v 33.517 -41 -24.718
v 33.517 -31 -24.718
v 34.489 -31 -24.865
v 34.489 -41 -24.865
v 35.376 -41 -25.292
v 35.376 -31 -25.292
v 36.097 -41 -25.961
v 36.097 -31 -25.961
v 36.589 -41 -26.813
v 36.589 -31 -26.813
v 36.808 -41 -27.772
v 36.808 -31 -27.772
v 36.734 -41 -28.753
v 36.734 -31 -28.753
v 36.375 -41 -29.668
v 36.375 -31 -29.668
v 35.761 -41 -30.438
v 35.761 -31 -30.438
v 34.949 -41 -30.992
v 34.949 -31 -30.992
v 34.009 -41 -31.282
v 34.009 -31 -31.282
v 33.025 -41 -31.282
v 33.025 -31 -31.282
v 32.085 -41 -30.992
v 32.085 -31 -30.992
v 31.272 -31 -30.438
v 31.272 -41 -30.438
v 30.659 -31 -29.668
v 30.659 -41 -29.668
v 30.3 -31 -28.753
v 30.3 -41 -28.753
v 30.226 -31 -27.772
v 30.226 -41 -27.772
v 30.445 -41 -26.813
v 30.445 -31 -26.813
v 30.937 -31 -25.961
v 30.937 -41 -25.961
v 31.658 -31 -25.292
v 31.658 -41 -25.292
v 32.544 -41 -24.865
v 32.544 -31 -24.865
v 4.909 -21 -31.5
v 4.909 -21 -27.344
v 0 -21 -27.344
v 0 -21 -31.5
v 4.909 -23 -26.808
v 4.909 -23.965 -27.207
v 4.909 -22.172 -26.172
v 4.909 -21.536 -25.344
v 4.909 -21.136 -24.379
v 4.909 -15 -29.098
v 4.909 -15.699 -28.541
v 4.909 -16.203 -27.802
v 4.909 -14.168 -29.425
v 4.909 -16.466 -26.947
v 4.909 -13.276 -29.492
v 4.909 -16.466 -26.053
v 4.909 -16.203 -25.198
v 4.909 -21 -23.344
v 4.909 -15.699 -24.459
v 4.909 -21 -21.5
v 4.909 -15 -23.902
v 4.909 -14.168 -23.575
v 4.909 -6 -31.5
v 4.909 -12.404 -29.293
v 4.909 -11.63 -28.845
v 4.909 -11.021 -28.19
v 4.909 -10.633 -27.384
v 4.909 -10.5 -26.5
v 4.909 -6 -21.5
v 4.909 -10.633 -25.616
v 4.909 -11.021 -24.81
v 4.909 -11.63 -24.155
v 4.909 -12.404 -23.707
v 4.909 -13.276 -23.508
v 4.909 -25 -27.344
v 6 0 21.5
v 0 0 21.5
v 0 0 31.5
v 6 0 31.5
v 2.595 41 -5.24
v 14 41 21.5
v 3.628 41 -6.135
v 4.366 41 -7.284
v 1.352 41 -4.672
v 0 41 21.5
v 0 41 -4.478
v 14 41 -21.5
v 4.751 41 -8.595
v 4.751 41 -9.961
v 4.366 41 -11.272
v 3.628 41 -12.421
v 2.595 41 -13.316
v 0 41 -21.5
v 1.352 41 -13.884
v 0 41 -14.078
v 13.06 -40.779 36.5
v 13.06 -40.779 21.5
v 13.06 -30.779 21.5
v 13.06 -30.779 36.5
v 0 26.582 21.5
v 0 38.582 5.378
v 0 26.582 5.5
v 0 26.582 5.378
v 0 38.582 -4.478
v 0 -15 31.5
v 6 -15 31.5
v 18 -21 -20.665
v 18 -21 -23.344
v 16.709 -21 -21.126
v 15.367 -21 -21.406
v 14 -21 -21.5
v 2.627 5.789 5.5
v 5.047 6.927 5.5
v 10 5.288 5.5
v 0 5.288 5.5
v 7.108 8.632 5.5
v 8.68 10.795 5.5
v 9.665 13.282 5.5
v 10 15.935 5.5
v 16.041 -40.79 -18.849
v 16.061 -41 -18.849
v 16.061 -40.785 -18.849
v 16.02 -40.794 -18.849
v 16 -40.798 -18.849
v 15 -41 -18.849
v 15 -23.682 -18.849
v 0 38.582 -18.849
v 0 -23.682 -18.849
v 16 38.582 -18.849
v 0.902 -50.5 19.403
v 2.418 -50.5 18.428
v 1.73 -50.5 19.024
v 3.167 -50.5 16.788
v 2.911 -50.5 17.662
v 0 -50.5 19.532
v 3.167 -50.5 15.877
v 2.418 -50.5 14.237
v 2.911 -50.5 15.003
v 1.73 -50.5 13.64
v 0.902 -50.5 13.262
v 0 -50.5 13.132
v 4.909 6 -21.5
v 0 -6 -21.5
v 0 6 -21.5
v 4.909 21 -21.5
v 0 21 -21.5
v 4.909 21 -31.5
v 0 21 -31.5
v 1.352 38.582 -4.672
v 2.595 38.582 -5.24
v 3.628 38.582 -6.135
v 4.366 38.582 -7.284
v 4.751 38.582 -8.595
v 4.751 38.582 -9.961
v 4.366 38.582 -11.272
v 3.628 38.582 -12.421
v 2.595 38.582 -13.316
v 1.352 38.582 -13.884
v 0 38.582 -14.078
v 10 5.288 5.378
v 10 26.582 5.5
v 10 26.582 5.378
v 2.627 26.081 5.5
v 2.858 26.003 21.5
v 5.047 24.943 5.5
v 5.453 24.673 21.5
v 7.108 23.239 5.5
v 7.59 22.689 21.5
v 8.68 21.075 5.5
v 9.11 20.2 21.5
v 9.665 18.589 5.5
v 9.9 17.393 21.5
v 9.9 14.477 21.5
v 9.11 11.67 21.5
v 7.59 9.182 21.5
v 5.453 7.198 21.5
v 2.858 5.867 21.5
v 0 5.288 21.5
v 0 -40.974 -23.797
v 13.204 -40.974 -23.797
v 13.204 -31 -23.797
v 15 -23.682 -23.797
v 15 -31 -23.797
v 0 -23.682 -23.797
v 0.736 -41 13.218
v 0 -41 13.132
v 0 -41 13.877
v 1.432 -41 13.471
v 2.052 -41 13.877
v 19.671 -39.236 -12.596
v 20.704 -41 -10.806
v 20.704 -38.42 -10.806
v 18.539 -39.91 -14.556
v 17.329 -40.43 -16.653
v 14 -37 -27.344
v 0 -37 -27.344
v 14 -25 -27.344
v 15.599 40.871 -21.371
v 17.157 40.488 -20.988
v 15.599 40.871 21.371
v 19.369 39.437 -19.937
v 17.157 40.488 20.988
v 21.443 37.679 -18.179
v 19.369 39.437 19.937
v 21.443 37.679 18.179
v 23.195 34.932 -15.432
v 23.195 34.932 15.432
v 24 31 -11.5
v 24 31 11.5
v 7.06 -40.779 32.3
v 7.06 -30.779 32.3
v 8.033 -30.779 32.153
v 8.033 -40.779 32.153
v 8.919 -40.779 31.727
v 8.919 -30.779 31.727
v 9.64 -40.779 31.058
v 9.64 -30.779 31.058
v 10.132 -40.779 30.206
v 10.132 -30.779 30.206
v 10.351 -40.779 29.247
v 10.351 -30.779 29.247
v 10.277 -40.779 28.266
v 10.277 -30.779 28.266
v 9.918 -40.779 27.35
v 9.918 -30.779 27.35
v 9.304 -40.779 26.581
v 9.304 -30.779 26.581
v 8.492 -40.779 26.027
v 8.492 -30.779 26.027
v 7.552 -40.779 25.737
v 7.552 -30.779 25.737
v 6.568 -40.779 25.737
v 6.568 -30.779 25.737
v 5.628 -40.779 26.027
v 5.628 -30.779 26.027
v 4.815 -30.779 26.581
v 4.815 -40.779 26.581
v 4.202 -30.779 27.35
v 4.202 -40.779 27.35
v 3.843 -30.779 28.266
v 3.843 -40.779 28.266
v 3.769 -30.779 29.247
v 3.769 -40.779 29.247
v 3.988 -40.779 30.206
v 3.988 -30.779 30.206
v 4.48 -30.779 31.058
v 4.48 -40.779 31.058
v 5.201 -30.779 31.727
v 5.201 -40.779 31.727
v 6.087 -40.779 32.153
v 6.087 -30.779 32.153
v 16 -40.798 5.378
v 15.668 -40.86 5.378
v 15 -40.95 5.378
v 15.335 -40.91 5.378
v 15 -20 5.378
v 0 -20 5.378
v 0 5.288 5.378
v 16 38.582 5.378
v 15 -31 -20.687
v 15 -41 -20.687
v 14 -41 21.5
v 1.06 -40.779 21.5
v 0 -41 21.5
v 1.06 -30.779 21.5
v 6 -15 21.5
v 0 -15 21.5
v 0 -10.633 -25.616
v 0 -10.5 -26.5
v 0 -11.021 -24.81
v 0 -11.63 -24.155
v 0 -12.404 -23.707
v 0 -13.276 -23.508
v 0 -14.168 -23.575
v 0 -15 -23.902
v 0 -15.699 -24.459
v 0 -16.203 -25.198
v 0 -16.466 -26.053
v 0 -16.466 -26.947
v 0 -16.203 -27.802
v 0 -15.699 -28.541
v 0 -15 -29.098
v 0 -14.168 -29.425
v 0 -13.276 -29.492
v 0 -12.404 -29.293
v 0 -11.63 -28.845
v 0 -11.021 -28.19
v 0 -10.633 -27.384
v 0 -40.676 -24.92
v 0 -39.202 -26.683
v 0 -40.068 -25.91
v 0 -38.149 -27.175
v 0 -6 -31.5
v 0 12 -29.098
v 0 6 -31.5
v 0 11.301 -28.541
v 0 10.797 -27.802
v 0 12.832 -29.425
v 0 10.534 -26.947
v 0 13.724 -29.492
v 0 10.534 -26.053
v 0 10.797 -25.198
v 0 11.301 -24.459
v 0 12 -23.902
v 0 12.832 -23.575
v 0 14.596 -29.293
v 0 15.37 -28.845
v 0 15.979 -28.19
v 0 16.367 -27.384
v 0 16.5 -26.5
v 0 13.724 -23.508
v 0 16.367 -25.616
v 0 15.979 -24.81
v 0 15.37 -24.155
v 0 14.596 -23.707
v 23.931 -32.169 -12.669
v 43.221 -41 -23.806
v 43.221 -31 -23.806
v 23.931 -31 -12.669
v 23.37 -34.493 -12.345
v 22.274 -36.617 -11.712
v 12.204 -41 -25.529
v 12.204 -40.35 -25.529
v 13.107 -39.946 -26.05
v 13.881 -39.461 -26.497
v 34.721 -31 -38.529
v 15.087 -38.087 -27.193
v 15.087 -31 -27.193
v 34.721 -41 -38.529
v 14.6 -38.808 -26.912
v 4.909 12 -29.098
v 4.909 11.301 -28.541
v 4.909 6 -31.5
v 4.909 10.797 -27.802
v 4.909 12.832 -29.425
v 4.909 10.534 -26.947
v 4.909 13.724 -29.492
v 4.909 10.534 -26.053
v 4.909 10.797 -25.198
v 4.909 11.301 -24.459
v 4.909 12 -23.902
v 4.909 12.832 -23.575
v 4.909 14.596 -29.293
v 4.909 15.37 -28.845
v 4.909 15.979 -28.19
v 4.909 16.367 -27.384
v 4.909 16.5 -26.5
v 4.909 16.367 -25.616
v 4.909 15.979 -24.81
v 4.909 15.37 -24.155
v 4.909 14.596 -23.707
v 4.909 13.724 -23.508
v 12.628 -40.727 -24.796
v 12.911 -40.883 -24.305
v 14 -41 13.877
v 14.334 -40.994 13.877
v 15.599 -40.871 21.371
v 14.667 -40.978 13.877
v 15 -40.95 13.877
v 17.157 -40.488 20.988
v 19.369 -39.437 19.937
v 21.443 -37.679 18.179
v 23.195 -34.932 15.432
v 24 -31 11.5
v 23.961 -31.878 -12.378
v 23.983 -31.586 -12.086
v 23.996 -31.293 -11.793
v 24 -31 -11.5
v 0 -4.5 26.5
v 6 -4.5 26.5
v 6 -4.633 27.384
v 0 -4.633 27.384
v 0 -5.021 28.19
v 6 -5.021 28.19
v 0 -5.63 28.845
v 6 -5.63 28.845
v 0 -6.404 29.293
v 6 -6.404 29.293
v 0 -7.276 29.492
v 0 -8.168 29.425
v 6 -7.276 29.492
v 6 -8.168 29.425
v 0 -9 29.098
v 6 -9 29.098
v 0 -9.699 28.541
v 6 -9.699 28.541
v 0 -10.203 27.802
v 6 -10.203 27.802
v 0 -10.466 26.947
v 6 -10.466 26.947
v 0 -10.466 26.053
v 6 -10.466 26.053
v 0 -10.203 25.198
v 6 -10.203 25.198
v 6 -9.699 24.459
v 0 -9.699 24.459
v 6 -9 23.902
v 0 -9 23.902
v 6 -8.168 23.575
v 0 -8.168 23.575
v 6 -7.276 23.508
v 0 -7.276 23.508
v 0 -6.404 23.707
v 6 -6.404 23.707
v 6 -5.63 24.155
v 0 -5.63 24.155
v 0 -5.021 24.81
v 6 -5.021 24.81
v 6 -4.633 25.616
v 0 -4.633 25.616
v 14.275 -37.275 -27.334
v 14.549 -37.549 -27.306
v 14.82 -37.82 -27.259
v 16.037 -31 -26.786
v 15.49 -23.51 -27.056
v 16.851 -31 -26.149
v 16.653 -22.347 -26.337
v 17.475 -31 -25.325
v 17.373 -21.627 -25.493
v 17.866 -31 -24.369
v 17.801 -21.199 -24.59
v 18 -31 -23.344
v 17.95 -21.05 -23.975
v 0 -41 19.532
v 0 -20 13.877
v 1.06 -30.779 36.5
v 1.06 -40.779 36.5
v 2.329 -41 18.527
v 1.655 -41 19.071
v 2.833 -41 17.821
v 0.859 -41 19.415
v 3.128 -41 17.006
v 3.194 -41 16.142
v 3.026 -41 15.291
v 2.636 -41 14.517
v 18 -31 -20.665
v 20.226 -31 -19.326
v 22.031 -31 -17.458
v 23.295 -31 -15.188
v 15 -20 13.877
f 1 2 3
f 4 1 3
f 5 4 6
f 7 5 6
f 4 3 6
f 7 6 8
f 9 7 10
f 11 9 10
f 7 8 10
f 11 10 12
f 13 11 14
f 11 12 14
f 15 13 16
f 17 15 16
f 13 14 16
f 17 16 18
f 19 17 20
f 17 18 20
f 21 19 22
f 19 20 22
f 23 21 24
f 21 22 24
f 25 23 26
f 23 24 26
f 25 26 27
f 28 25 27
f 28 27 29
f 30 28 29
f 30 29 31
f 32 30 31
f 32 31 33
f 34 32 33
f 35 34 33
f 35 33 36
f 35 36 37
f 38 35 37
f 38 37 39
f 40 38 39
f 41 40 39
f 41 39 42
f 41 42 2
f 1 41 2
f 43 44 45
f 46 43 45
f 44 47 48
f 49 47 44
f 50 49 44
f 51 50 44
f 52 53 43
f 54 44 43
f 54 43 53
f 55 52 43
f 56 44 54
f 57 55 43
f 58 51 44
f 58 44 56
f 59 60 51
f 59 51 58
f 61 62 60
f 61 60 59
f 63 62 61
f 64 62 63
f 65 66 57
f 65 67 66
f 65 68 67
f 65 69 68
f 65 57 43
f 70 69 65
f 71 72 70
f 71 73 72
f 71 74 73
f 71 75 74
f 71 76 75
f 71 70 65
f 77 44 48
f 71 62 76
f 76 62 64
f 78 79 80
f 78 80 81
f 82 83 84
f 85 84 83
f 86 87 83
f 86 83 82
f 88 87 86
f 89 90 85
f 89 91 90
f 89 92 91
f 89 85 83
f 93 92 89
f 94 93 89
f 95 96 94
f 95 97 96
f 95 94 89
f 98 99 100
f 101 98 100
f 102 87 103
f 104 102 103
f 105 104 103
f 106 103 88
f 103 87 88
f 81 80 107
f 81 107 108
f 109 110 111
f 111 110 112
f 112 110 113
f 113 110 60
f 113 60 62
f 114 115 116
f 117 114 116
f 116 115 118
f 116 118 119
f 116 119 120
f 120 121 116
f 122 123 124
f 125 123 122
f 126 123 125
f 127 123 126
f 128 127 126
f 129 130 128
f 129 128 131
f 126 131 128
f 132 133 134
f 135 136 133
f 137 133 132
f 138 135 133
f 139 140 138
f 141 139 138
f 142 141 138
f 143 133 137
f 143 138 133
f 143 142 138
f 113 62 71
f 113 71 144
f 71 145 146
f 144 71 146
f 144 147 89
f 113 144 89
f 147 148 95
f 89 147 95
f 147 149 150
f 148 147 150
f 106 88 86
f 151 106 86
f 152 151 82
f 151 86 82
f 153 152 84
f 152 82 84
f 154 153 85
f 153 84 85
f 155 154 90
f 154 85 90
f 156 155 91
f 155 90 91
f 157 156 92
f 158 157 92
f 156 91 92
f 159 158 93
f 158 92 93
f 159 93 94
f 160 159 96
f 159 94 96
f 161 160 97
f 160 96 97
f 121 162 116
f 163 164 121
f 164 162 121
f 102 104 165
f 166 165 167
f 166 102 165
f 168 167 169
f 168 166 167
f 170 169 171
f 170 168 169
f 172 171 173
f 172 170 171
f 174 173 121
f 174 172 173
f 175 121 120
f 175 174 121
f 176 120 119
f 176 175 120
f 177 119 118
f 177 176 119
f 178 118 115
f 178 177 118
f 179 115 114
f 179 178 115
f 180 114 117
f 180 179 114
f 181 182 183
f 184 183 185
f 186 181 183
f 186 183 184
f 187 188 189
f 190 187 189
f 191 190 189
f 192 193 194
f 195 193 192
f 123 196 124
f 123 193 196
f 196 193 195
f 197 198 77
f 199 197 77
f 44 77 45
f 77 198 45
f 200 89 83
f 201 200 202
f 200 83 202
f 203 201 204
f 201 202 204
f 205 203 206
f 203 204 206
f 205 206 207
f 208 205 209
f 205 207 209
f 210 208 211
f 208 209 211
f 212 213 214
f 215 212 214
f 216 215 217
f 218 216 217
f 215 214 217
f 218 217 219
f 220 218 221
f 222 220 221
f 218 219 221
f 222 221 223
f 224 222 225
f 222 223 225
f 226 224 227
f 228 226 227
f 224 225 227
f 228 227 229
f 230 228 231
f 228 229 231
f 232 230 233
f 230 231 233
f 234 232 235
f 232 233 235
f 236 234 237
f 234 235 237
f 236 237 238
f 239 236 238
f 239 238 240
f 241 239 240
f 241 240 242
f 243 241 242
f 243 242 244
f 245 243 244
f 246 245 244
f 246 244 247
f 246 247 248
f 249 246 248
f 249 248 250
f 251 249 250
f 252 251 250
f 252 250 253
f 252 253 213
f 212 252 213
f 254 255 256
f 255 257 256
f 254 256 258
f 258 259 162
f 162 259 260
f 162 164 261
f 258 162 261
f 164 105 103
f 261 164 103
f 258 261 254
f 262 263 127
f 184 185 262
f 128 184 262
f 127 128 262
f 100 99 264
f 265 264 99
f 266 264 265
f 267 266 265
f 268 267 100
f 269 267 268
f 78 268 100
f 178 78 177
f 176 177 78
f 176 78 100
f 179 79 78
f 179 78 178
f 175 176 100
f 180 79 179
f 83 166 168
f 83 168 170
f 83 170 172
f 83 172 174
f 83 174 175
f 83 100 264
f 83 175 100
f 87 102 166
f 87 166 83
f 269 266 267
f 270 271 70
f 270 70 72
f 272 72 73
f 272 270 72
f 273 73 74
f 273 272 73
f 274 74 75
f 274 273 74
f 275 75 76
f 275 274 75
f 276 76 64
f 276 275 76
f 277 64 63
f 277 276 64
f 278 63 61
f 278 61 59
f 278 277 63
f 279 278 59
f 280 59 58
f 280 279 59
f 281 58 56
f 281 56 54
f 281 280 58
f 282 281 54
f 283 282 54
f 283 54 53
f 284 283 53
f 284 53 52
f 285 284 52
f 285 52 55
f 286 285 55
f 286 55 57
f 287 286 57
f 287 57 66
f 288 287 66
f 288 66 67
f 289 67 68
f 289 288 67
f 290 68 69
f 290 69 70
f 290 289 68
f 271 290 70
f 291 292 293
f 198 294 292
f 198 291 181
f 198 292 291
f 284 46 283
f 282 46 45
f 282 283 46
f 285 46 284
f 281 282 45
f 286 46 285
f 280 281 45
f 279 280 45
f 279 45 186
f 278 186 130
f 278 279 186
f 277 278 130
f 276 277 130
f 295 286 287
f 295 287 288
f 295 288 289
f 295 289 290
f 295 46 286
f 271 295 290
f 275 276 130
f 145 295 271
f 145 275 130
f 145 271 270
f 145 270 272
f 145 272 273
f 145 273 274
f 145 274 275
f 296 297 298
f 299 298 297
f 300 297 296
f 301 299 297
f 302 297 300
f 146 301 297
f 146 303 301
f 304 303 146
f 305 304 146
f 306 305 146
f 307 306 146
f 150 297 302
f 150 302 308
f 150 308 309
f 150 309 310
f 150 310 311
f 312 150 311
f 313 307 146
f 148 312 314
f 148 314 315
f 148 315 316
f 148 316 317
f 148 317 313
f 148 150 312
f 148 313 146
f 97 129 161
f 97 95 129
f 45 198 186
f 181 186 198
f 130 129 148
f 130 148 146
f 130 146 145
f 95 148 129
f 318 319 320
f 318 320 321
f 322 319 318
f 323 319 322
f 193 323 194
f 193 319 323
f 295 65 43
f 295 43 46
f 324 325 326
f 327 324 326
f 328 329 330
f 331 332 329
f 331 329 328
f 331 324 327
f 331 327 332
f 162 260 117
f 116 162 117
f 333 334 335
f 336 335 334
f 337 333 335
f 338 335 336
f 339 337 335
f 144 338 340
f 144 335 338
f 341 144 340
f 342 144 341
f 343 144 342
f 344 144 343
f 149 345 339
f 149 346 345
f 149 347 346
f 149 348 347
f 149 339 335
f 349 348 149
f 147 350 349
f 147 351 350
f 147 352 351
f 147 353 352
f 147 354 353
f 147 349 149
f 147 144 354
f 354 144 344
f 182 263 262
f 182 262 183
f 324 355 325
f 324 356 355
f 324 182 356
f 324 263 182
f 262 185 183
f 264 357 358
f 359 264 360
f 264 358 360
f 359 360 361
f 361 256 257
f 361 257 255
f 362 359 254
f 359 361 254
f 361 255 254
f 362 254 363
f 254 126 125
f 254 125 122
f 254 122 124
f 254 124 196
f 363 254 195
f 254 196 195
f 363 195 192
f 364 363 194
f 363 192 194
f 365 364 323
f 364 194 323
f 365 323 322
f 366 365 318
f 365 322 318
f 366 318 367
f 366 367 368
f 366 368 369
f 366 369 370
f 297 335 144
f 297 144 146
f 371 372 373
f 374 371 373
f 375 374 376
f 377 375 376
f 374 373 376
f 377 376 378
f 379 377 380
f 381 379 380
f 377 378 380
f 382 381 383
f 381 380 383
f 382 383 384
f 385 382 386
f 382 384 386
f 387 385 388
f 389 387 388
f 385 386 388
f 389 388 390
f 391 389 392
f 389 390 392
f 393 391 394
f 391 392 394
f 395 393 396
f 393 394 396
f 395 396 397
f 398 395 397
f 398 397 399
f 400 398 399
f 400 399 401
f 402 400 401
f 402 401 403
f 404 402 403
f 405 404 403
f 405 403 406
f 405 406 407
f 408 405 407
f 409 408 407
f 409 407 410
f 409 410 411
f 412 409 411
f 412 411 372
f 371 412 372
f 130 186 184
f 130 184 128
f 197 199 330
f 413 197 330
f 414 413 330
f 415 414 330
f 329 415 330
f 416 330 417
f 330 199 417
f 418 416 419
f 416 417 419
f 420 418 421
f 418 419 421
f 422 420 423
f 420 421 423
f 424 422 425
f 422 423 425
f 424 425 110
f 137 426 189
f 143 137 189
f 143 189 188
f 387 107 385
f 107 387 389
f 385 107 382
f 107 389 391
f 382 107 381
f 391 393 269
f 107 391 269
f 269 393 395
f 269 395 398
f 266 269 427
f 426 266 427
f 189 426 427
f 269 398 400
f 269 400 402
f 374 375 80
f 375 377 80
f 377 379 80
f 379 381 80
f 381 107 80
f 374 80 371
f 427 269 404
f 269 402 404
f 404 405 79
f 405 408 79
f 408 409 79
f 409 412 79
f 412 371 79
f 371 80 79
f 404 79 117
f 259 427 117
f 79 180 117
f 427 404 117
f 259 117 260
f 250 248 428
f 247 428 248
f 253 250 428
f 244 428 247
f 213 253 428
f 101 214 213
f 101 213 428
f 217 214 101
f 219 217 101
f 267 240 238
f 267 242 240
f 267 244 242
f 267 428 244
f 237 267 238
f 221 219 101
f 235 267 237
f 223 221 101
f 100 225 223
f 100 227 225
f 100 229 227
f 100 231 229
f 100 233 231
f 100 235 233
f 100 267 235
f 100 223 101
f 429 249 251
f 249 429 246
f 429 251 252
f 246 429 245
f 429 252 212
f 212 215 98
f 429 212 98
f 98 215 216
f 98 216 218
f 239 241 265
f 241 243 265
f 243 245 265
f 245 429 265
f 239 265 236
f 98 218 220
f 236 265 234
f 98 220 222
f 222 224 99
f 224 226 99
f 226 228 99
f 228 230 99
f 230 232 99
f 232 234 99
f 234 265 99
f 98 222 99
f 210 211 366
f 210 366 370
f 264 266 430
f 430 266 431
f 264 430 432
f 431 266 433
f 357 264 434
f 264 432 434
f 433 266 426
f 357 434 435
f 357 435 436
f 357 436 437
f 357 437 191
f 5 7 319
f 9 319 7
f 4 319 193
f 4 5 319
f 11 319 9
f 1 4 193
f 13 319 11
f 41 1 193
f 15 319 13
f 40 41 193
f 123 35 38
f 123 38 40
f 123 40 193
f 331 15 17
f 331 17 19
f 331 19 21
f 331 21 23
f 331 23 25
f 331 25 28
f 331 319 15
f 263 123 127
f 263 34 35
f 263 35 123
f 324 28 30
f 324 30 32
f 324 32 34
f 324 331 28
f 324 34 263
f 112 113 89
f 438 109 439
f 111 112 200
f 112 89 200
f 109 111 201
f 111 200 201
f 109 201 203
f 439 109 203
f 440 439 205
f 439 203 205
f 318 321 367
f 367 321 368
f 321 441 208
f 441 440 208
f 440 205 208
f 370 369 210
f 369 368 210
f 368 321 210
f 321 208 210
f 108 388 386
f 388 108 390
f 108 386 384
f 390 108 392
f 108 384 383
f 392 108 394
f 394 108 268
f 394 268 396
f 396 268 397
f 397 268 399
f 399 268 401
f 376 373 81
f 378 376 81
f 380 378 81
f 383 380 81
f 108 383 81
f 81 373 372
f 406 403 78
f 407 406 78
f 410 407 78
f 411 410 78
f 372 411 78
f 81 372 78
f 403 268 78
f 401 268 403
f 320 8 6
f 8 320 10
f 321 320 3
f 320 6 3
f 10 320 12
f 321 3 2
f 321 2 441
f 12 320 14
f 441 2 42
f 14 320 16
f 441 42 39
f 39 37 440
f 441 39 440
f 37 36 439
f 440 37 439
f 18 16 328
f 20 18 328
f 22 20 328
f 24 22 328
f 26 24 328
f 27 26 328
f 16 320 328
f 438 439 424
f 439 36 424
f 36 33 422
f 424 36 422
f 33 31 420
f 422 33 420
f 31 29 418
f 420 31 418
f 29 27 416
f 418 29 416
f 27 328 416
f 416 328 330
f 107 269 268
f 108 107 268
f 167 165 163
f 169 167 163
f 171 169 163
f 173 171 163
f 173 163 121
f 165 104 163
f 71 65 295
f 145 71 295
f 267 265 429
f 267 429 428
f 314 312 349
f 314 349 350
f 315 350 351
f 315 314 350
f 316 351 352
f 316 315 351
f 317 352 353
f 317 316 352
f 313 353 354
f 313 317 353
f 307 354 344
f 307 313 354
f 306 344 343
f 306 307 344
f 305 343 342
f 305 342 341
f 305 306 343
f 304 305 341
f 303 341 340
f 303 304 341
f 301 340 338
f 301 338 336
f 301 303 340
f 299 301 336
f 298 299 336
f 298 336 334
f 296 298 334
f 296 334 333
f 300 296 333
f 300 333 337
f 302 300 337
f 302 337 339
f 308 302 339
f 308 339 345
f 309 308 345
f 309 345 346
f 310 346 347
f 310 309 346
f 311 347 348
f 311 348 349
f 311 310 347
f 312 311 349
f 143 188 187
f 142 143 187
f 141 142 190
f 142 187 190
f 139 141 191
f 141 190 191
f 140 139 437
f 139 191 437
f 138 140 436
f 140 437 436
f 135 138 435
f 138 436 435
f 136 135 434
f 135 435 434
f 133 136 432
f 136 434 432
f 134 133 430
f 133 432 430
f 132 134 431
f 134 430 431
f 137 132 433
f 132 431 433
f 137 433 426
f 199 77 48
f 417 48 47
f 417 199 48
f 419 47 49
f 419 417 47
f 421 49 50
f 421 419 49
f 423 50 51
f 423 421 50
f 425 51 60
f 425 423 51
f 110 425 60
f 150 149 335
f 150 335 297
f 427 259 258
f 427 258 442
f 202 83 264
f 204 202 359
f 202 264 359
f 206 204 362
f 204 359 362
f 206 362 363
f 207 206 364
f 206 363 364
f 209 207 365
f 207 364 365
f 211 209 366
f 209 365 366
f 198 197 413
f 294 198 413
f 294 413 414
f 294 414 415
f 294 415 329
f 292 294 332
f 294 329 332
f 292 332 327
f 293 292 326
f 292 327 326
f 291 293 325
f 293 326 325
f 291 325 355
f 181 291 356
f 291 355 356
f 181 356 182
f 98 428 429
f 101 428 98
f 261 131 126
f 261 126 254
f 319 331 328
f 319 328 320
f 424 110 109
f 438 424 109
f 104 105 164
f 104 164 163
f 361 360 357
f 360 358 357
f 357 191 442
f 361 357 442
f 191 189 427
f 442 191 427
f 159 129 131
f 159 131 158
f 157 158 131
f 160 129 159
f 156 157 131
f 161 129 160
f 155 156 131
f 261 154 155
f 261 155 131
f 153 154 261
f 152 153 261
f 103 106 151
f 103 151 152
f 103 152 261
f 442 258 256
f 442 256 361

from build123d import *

# Parameters (mm, degrees)
CROQUIS2_W              = 43
CROQUIS2_H              = 82
SALIENTE_EXTRUIR1_DEPTH = 24
CROQUIS3_W              = 24.22772491
CROQUIS3_H              = 79.582021813
CORTAR_EXTRUIR1_DEPTH   = 16
CROQUIS4_W              = 16.121738507
CROQUIS4_H              = 21.293525096
CORTAR_EXTRUIR2_DEPTH   = 10
CORTAR_EXTRUIR4_DEPTH   = 89.103632161
REDONDEO1_R             = 10
SALIENTE_EXTRUIR3_DEPTH = 16
CROQUIS8_W              = 4.909457408
CROQUIS8_H              = 15
SALIENTE_EXTRUIR4_DEPTH = 10
CORTAR_EXTRUIR5_START   = -4.909458
CROQUIS9_R              = 3
CORTAR_EXTRUIR5_DEPTH   = 4.909458
SALIENTE_EXTRUIR5_DEPTH = 9.5
CROQUIS12_W             = 8.494170986
CROQUIS12_H             = 20
SALIENTE_EXTRUIR6_DEPTH = 18
CROQUIS12_3_W           = 8.498446764
CROQUIS12_3_H           = 21
CORTAR_EXTRUIR6_DEPTH   = 15
CROQUIS13_W             = 4.947680971
CROQUIS13_H             = 17.318298189
CORTAR_EXTRUIR8_DEPTH   = 15
REDONDEO6_R             = 4
CROQUIS14_W             = 12
CROQUIS14_H             = 10
SALIENTE_EXTRUIR7_DEPTH = 15
CROQUIS16_R             = 3.3
CORTAR_EXTRUIR9_DEPTH   = 85.026241651
SALIENTE_EXTRUIR8_DEPTH = 10
CROQUIS21_R             = 3.3
CORTAR_EXTRUIR10_DEPTH  = 93.393365129
CROQUIS22_W             = 6
CROQUIS22_H             = 15
SALIENTE_EXTRUIR9_DEPTH = 10
CROQUIS23_R             = 3
CORTAR_EXTRUIR11_DEPTH  = 10


with BuildPart() as part:
    # Croquis2 → Saliente-Extruir1 (new body)
    with BuildSketch(Plane(origin=(0, 0, 0), x_dir=(0, 0, -1), z_dir=(1, 0, 0))):
        Rectangle(CROQUIS2_W, CROQUIS2_H)
    extrude(amount=SALIENTE_EXTRUIR1_DEPTH)

    # Croquis3 → Cortar-Extruir1 (cut)
    with BuildSketch(Plane.ZY):
        with Locations((-6.735600962, -1.208989093)):
            Rectangle(CROQUIS3_W, CROQUIS3_H)
    extrude(amount=-CORTAR_EXTRUIR1_DEPTH, mode=Mode.SUBTRACT)

    # Croquis4 → Cortar-Extruir2 (cut)
    with BuildSketch(Plane.ZY):
        with Locations((13.439130747, 15.935259265)):
            Rectangle(CROQUIS4_W, CROQUIS4_H)
    extrude(amount=-CORTAR_EXTRUIR2_DEPTH, mode=Mode.SUBTRACT)

    # Croquis5 → Cortar-Extruir4 (cut, through all)
    with BuildSketch(Plane(origin=(0, 41, 0), x_dir=(1, 0, 0), z_dir=(0, 1, 0))):
        with BuildLine():
            Line((0, 14.078023223), (0, 4.478023223))
            ThreePointArc((0, 4.478023223), (4.8, 9.278023223), (0, 14.078023223))
        make_face()
    extrude(amount=-CORTAR_EXTRUIR4_DEPTH, mode=Mode.SUBTRACT)

    # Redondeo1
    # the kernel refuses this fillet: 10 mm, written as the material it takes off along each edge
    with BuildSketch(Plane(origin=(24, 66, -21.5), x_dir=(0, 0, 1), z_dir=(0, -1, 0))) as redondeo1_piece_1:
        with BuildLine():
            CenterArc((REDONDEO1_R, REDONDEO1_R), REDONDEO1_R, 180, 90)
            Line((0, REDONDEO1_R), (0, 0))
            Line((0, 0), (REDONDEO1_R, 0))
        make_face()
    extrude(amount=132, mode=Mode.SUBTRACT)
    with BuildSketch(Plane(origin=(24, 41, 46.5), x_dir=(0, -1, 0), z_dir=(0, 0, -1))) as redondeo1_piece_2:
        with BuildLine():
            CenterArc((REDONDEO1_R, REDONDEO1_R), REDONDEO1_R, 180, 90)
            Line((0, REDONDEO1_R), (0, 0))
            Line((0, 0), (REDONDEO1_R, 0))
        make_face()
    extrude(amount=93, mode=Mode.SUBTRACT)
    with BuildSketch(Plane(origin=(24, -66, 21.5), x_dir=(-1, 0, 0), z_dir=(0, 1, 0))) as redondeo1_piece_3:
        with BuildLine():
            CenterArc((REDONDEO1_R, -REDONDEO1_R), REDONDEO1_R, 90, 90)
            Line((0, -REDONDEO1_R), (0, 0))
            Line((0, 0), (REDONDEO1_R, 0))
        make_face()
    extrude(amount=132, mode=Mode.SUBTRACT)
    with BuildSketch(Plane(origin=(24, -41, -46.5), x_dir=(-1, 0, 0), z_dir=(0, 0, 1))) as redondeo1_piece_4:
        with BuildLine():
            CenterArc((REDONDEO1_R, -REDONDEO1_R), REDONDEO1_R, 90, 90)
            Line((0, -REDONDEO1_R), (0, 0))
            Line((0, 0), (REDONDEO1_R, 0))
        make_face()
    extrude(amount=93, mode=Mode.SUBTRACT)

    # Croquis7 → Saliente-Extruir3 (add)
    with BuildSketch(Plane.XY.offset(21.5)):
        with BuildLine():
            Line((0, -41), (14, -41))
            Line((14, -41), (14, 41))
            Line((14, 41), (0, 41))
            Line((0, 41), (0, 26.582021813))
            ThreePointArc((0, 26.582021813), (10, 15.935259265), (0, 5.288496717))
            Line((0, 5.288496717), (0, -41))
        make_face()
    extrude(amount=-SALIENTE_EXTRUIR3_DEPTH)

    # Croquis8 → Saliente-Extruir4 (add)
    with BuildSketch(Plane(origin=(0, 0, -21.5), x_dir=(-1, 0, 0), z_dir=(0, 0, -1))):
        with Locations((-2.454728704, 13.5)):
            Rectangle(CROQUIS8_W, CROQUIS8_H)
        with Locations((-2.454728704, -13.5)):
            Rectangle(CROQUIS8_W, CROQUIS8_H)
    extrude(amount=SALIENTE_EXTRUIR4_DEPTH)

    # Croquis9 → Cortar-Extruir5 (cut)
    with BuildSketch(Plane(origin=(4.909457408, 0, 0), x_dir=(0, 0, -1), z_dir=(1, 0, 0)).offset(CORTAR_EXTRUIR5_START)):
        with Locations(Location((26.5, 13.5, 0), (0, 0, 90))):
            Circle(CROQUIS9_R)
        with Locations(Location((26.5, -13.5, 0), (0, 0, 90))):
            Circle(CROQUIS9_R)
    extrude(amount=CORTAR_EXTRUIR5_DEPTH, mode=Mode.SUBTRACT)

    # Croquis10 → Saliente-Extruir5 (add)
    with BuildSketch(Plane(origin=(0, -41, 0), x_dir=(-1, 0, 0), z_dir=(0, -1, 0))):
        with BuildLine():
            Line((0, -19.532438339), (0, -13.132438339))
            ThreePointArc((0, -13.132438339), (-3.2, -16.332438339), (0, -19.532438339))
        make_face()
    extrude(amount=SALIENTE_EXTRUIR5_DEPTH)

    # Croquis12 → Saliente-Extruir6 (add)
    with BuildSketch(Plane.ZY):
        with Locations((-23.09654891, -31)):
            Rectangle(CROQUIS12_W, CROQUIS12_H)
    extrude(amount=-SALIENTE_EXTRUIR6_DEPTH)

    # Croquis12<3> → Cortar-Extruir6 (cut)
    with BuildSketch(Plane.ZY):
        with Locations((9.627484875, -30.5)):
            Rectangle(CROQUIS12_3_W, CROQUIS12_3_H)
    extrude(amount=-CORTAR_EXTRUIR6_DEPTH, mode=Mode.SUBTRACT)

    # Croquis13 → Cortar-Extruir8 (cut)
    with BuildSketch(Plane.ZY):
        with Locations((-21.323303903, -32.340850905)):
            Rectangle(CROQUIS13_W, CROQUIS13_H)
    extrude(amount=-CORTAR_EXTRUIR8_DEPTH, mode=Mode.SUBTRACT)

    # Redondeo6
    redondeo6_edges = [part.edges().sort_by_distance(p)[0] for p in [
        (11.454728704, -21, -27.343634403),
        (9, -41, -27.343634403),
        (18, -31, -27.343634403),
    ]]
    fillet(redondeo6_edges, radius=REDONDEO6_R)

    # Croquis14 → Saliente-Extruir7 (add)
    with BuildSketch(Plane.XY.offset(21.5)):
        with Locations((7.059903913, -35.778543354)):
            Rectangle(CROQUIS14_W, CROQUIS14_H)
    extrude(amount=SALIENTE_EXTRUIR7_DEPTH)

    # Croquis16 → Cortar-Extruir9 (cut, through all)
    with BuildSketch(Plane(origin=(0, -30.778543354, 0), x_dir=(1, 0, 0), z_dir=(0, 1, 0))):
        with Locations(Location((7.059903913, -29, 0), (0, 0, 270))):
            Circle(CROQUIS16_R)
        with Locations((33.516786786, 28.018487534)):
            Circle(CROQUIS16_R)
    extrude(amount=-CORTAR_EXTRUIR9_DEPTH, mode=Mode.SUBTRACT)

    # Croquis19 → Saliente-Extruir8 (add)
    with BuildSketch(Plane(origin=(0, -41, 0), x_dir=(1, 0, 0), z_dir=(0, 1, 0))):
        Polygon((43.22114317, 23.806345729), (20.704482672, 10.806345729), (12.204482672, 25.528777593), (34.72114317, 38.528777593), align=None)
    extrude(amount=SALIENTE_EXTRUIR8_DEPTH)

    # Croquis21 → Cortar-Extruir10 (cut, through all)
    with BuildSketch(Plane(origin=(0, -31, 0), x_dir=(1, 0, 0), z_dir=(0, 1, 0))):
        with Locations(Location((33.516786786, 28.018487534, 0), (0, 0, 270))):
            Circle(CROQUIS21_R)
    extrude(amount=-CORTAR_EXTRUIR10_DEPTH, mode=Mode.SUBTRACT)

    # Croquis22 → Saliente-Extruir9 (add)
    with BuildSketch(Plane.XY.offset(21.5)):
        with Locations((3, -7.5)):
            Rectangle(CROQUIS22_W, CROQUIS22_H)
    extrude(amount=SALIENTE_EXTRUIR9_DEPTH)

    # Croquis23 → Cortar-Extruir11 (cut)
    with BuildSketch(Plane(origin=(6, 0, 0), x_dir=(0, 0, -1), z_dir=(1, 0, 0))):
        with Locations(Location((-26.5, -7.5, 0), (0, 0, 90))):
            Circle(CROQUIS23_R)
    extrude(amount=-CORTAR_EXTRUIR11_DEPTH, mode=Mode.SUBTRACT)


solid = part.part
